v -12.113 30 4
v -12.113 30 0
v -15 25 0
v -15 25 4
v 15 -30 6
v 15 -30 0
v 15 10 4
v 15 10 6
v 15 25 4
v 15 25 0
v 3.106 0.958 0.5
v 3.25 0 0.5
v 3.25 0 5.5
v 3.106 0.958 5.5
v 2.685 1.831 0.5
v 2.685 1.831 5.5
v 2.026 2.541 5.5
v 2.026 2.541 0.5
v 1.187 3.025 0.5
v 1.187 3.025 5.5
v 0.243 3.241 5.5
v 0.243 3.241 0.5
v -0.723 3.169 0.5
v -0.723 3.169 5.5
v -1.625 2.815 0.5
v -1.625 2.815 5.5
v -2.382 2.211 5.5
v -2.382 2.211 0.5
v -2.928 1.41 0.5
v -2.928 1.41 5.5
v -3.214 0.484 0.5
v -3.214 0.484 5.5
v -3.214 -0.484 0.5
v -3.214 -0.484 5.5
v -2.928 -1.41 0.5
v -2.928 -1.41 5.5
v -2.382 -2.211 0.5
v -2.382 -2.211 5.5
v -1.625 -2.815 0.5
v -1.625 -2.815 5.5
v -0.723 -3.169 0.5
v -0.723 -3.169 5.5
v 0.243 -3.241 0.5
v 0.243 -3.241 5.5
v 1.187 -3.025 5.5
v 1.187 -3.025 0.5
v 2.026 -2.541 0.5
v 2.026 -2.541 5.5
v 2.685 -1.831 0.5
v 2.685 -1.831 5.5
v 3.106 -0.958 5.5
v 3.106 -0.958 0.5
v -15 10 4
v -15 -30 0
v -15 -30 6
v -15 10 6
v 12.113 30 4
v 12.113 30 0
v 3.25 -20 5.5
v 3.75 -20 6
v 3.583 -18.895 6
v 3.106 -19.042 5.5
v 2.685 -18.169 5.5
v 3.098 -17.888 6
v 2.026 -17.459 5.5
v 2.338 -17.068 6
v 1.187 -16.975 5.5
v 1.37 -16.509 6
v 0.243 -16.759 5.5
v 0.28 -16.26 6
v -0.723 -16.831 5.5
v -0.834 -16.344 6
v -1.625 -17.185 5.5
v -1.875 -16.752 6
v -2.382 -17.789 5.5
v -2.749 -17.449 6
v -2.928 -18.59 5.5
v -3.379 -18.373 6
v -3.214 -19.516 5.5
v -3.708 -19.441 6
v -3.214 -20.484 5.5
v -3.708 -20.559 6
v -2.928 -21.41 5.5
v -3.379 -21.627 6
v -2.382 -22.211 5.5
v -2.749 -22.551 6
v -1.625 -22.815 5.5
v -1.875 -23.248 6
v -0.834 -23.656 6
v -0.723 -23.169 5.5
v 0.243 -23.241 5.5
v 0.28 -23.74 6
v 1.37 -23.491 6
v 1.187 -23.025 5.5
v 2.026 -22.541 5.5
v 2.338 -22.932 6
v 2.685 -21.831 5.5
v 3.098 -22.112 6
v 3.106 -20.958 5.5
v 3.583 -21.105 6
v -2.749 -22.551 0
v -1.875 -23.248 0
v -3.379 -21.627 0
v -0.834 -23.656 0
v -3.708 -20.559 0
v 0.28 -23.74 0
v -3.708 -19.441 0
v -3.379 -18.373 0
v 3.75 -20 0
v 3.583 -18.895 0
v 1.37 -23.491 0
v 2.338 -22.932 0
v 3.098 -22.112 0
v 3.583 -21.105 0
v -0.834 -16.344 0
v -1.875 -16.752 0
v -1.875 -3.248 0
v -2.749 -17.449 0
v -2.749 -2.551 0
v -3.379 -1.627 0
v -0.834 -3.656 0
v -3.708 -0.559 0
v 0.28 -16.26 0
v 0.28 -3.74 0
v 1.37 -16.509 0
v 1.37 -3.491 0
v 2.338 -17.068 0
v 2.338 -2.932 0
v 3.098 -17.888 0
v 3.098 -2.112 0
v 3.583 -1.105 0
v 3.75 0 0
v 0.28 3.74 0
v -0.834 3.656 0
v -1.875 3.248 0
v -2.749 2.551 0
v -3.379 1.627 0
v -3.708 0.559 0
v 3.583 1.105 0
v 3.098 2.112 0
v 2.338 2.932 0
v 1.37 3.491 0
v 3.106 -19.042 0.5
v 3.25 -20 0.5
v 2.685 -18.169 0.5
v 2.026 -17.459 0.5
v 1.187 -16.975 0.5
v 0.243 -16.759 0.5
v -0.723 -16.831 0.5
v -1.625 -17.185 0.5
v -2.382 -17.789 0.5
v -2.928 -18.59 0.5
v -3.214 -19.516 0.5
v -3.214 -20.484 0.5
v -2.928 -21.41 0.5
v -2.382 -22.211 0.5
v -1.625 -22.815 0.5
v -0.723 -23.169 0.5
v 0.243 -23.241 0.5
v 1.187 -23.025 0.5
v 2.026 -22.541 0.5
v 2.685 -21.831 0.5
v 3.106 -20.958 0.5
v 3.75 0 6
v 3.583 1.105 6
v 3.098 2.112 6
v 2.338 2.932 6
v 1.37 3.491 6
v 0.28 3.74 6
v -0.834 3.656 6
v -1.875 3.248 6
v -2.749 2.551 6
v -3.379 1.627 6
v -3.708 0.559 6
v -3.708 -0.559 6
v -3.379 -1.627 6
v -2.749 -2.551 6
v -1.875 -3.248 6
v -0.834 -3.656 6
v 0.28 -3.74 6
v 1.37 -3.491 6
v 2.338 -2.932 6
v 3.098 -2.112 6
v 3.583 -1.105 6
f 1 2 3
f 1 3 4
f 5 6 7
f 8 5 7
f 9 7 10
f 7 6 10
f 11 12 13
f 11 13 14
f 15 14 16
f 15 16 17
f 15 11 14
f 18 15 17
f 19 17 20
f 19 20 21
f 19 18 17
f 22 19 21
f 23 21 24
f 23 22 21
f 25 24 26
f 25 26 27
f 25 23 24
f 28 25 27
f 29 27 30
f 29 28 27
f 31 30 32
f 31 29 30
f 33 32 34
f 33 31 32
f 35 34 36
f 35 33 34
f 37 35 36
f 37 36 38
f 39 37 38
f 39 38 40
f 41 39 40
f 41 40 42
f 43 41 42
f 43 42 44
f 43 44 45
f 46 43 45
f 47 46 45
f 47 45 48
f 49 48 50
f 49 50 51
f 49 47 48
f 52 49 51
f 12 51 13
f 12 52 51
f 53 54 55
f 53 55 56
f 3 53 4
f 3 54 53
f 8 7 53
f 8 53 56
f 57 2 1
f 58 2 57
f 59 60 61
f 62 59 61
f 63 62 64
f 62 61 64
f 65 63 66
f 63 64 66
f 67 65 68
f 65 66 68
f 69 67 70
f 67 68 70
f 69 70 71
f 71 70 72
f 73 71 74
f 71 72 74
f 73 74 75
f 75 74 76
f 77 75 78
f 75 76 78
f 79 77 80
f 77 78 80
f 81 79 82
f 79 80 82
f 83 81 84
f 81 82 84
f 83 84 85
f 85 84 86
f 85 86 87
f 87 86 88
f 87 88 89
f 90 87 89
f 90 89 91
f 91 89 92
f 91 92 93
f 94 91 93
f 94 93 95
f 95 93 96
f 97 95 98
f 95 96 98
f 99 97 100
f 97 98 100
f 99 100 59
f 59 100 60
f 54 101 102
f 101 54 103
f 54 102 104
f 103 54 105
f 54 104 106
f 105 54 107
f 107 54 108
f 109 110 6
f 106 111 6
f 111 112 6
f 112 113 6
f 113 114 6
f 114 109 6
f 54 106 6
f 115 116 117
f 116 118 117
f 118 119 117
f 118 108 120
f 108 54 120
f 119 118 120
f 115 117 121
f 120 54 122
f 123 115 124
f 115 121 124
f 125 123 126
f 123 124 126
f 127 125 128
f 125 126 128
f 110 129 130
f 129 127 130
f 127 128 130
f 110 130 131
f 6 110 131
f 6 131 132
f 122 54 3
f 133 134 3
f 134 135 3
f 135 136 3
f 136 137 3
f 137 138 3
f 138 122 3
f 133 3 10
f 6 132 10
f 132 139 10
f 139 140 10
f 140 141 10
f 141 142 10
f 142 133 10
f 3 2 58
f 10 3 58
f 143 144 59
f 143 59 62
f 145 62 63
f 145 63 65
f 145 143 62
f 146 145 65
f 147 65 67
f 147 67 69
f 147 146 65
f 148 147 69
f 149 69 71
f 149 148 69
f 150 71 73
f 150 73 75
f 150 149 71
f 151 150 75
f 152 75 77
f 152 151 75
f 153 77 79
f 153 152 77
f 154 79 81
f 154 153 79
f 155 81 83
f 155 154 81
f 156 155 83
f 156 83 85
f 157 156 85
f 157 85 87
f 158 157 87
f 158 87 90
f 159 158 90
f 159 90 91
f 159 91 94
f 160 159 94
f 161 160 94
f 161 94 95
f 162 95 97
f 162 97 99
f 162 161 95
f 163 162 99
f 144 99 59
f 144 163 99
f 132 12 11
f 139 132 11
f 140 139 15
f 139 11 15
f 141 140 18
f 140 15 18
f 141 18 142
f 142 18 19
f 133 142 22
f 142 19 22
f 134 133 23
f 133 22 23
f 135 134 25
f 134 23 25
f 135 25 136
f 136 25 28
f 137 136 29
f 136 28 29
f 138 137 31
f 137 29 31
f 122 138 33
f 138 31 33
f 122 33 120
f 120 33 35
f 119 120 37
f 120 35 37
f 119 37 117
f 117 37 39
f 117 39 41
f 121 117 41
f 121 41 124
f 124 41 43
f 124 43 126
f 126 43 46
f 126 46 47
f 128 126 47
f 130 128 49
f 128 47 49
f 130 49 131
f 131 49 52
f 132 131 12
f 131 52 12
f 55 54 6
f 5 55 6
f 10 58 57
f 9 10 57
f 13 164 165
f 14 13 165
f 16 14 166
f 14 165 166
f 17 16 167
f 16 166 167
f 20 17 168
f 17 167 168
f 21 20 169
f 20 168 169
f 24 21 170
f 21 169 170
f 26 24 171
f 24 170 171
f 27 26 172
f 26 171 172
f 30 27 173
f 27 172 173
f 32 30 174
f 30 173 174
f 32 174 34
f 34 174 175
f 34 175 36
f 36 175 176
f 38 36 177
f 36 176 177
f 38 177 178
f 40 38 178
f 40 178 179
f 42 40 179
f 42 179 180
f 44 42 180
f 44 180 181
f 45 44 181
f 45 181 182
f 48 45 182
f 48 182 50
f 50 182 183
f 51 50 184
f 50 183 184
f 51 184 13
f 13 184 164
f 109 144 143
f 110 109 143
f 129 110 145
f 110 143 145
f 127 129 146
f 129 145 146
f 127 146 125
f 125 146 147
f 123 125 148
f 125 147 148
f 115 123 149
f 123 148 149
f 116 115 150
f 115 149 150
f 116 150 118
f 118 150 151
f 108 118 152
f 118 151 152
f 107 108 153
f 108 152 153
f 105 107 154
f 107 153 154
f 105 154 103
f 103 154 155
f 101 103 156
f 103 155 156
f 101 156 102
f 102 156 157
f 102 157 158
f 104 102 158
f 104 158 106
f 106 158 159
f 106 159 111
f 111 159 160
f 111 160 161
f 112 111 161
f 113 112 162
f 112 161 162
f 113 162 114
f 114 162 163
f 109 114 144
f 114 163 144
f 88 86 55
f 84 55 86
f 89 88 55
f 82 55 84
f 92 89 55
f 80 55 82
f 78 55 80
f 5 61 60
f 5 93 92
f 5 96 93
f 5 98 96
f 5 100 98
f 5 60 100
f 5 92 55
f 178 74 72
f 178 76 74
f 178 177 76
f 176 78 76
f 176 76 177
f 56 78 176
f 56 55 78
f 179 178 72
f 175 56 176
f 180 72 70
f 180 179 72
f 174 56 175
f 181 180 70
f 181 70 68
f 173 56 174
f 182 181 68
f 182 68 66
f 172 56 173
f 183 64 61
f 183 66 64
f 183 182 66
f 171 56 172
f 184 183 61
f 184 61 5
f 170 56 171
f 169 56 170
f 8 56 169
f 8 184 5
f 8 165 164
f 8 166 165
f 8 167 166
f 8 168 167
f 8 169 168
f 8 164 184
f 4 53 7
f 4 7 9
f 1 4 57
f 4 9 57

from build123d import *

# Parameters (mm, degrees)
SKETCH_1_W          = 30
SKETCH_1_H          = 60
SKETCH_1_R          = 3.25
EXTRUDE_1_DEPTH     = 6
SKETCH_2_W          = 2
SKETCH_2_H          = 20
CUT_EXTRUDE_1_DEPTH = 31
CHAMFER_2_SIZE      = 5
CHAMFER_2_SIZE2     = 2.886751346
CHAMFER_3_SIZE      = 5
CHAMFER_3_SIZE2     = 2.886751346
CHAMFER_4_SIZE      = 0.5


with BuildPart() as part:
    # Эскиз1 → Бобышка-Вытянуть1 (new body)
    with BuildSketch(Plane.XY):
        Rectangle(SKETCH_1_W, SKETCH_1_H)
        with Locations((0, -20)):
            Circle(SKETCH_1_R, mode=Mode.SUBTRACT)
        Circle(SKETCH_1_R, mode=Mode.SUBTRACT)
    extrude(amount=EXTRUDE_1_DEPTH)

    # Эскиз2 → Вырез-Вытянуть1 (cut, through all)
    with BuildSketch(Plane.ZY.offset(-15)):
        with Locations((5, 20)):
            Rectangle(SKETCH_2_W, SKETCH_2_H)
    extrude(amount=CUT_EXTRUDE_1_DEPTH, mode=Mode.SUBTRACT)

    # Фаска2
    chamfer_2_edges = [part.edges().sort_by_distance(p)[0] for p in [
        (-15, 30, 2),
    ]]
    chamfer_2_side = [part.faces().sort_by_distance(p)[0] for p in [
        (-15, -2.5, 2.75),
    ]]
    chamfer(chamfer_2_edges, length=CHAMFER_2_SIZE, length2=CHAMFER_2_SIZE2, reference=chamfer_2_side[0])

    # Фаска3
    chamfer_3_edges = [part.edges().sort_by_distance(p)[0] for p in [
        (15, 30, 2),
    ]]
    chamfer_3_side = [part.faces().sort_by_distance(p)[0] for p in [
        (15, -2.5, 2.75),
    ]]
    chamfer(chamfer_3_edges, length=CHAMFER_3_SIZE, length2=CHAMFER_3_SIZE2, reference=chamfer_3_side[0])

    # Фаска4
    chamfer_4_edges = [part.edges().sort_by_distance(p)[0] for p in [
        (-3.25, -20, 0),
        (-3.25, -20, 6),
        (-3.25, 0, 0),
        (-3.25, 0, 6),
    ]]
    chamfer(chamfer_4_edges, length=CHAMFER_4_SIZE)


solid = part.part
